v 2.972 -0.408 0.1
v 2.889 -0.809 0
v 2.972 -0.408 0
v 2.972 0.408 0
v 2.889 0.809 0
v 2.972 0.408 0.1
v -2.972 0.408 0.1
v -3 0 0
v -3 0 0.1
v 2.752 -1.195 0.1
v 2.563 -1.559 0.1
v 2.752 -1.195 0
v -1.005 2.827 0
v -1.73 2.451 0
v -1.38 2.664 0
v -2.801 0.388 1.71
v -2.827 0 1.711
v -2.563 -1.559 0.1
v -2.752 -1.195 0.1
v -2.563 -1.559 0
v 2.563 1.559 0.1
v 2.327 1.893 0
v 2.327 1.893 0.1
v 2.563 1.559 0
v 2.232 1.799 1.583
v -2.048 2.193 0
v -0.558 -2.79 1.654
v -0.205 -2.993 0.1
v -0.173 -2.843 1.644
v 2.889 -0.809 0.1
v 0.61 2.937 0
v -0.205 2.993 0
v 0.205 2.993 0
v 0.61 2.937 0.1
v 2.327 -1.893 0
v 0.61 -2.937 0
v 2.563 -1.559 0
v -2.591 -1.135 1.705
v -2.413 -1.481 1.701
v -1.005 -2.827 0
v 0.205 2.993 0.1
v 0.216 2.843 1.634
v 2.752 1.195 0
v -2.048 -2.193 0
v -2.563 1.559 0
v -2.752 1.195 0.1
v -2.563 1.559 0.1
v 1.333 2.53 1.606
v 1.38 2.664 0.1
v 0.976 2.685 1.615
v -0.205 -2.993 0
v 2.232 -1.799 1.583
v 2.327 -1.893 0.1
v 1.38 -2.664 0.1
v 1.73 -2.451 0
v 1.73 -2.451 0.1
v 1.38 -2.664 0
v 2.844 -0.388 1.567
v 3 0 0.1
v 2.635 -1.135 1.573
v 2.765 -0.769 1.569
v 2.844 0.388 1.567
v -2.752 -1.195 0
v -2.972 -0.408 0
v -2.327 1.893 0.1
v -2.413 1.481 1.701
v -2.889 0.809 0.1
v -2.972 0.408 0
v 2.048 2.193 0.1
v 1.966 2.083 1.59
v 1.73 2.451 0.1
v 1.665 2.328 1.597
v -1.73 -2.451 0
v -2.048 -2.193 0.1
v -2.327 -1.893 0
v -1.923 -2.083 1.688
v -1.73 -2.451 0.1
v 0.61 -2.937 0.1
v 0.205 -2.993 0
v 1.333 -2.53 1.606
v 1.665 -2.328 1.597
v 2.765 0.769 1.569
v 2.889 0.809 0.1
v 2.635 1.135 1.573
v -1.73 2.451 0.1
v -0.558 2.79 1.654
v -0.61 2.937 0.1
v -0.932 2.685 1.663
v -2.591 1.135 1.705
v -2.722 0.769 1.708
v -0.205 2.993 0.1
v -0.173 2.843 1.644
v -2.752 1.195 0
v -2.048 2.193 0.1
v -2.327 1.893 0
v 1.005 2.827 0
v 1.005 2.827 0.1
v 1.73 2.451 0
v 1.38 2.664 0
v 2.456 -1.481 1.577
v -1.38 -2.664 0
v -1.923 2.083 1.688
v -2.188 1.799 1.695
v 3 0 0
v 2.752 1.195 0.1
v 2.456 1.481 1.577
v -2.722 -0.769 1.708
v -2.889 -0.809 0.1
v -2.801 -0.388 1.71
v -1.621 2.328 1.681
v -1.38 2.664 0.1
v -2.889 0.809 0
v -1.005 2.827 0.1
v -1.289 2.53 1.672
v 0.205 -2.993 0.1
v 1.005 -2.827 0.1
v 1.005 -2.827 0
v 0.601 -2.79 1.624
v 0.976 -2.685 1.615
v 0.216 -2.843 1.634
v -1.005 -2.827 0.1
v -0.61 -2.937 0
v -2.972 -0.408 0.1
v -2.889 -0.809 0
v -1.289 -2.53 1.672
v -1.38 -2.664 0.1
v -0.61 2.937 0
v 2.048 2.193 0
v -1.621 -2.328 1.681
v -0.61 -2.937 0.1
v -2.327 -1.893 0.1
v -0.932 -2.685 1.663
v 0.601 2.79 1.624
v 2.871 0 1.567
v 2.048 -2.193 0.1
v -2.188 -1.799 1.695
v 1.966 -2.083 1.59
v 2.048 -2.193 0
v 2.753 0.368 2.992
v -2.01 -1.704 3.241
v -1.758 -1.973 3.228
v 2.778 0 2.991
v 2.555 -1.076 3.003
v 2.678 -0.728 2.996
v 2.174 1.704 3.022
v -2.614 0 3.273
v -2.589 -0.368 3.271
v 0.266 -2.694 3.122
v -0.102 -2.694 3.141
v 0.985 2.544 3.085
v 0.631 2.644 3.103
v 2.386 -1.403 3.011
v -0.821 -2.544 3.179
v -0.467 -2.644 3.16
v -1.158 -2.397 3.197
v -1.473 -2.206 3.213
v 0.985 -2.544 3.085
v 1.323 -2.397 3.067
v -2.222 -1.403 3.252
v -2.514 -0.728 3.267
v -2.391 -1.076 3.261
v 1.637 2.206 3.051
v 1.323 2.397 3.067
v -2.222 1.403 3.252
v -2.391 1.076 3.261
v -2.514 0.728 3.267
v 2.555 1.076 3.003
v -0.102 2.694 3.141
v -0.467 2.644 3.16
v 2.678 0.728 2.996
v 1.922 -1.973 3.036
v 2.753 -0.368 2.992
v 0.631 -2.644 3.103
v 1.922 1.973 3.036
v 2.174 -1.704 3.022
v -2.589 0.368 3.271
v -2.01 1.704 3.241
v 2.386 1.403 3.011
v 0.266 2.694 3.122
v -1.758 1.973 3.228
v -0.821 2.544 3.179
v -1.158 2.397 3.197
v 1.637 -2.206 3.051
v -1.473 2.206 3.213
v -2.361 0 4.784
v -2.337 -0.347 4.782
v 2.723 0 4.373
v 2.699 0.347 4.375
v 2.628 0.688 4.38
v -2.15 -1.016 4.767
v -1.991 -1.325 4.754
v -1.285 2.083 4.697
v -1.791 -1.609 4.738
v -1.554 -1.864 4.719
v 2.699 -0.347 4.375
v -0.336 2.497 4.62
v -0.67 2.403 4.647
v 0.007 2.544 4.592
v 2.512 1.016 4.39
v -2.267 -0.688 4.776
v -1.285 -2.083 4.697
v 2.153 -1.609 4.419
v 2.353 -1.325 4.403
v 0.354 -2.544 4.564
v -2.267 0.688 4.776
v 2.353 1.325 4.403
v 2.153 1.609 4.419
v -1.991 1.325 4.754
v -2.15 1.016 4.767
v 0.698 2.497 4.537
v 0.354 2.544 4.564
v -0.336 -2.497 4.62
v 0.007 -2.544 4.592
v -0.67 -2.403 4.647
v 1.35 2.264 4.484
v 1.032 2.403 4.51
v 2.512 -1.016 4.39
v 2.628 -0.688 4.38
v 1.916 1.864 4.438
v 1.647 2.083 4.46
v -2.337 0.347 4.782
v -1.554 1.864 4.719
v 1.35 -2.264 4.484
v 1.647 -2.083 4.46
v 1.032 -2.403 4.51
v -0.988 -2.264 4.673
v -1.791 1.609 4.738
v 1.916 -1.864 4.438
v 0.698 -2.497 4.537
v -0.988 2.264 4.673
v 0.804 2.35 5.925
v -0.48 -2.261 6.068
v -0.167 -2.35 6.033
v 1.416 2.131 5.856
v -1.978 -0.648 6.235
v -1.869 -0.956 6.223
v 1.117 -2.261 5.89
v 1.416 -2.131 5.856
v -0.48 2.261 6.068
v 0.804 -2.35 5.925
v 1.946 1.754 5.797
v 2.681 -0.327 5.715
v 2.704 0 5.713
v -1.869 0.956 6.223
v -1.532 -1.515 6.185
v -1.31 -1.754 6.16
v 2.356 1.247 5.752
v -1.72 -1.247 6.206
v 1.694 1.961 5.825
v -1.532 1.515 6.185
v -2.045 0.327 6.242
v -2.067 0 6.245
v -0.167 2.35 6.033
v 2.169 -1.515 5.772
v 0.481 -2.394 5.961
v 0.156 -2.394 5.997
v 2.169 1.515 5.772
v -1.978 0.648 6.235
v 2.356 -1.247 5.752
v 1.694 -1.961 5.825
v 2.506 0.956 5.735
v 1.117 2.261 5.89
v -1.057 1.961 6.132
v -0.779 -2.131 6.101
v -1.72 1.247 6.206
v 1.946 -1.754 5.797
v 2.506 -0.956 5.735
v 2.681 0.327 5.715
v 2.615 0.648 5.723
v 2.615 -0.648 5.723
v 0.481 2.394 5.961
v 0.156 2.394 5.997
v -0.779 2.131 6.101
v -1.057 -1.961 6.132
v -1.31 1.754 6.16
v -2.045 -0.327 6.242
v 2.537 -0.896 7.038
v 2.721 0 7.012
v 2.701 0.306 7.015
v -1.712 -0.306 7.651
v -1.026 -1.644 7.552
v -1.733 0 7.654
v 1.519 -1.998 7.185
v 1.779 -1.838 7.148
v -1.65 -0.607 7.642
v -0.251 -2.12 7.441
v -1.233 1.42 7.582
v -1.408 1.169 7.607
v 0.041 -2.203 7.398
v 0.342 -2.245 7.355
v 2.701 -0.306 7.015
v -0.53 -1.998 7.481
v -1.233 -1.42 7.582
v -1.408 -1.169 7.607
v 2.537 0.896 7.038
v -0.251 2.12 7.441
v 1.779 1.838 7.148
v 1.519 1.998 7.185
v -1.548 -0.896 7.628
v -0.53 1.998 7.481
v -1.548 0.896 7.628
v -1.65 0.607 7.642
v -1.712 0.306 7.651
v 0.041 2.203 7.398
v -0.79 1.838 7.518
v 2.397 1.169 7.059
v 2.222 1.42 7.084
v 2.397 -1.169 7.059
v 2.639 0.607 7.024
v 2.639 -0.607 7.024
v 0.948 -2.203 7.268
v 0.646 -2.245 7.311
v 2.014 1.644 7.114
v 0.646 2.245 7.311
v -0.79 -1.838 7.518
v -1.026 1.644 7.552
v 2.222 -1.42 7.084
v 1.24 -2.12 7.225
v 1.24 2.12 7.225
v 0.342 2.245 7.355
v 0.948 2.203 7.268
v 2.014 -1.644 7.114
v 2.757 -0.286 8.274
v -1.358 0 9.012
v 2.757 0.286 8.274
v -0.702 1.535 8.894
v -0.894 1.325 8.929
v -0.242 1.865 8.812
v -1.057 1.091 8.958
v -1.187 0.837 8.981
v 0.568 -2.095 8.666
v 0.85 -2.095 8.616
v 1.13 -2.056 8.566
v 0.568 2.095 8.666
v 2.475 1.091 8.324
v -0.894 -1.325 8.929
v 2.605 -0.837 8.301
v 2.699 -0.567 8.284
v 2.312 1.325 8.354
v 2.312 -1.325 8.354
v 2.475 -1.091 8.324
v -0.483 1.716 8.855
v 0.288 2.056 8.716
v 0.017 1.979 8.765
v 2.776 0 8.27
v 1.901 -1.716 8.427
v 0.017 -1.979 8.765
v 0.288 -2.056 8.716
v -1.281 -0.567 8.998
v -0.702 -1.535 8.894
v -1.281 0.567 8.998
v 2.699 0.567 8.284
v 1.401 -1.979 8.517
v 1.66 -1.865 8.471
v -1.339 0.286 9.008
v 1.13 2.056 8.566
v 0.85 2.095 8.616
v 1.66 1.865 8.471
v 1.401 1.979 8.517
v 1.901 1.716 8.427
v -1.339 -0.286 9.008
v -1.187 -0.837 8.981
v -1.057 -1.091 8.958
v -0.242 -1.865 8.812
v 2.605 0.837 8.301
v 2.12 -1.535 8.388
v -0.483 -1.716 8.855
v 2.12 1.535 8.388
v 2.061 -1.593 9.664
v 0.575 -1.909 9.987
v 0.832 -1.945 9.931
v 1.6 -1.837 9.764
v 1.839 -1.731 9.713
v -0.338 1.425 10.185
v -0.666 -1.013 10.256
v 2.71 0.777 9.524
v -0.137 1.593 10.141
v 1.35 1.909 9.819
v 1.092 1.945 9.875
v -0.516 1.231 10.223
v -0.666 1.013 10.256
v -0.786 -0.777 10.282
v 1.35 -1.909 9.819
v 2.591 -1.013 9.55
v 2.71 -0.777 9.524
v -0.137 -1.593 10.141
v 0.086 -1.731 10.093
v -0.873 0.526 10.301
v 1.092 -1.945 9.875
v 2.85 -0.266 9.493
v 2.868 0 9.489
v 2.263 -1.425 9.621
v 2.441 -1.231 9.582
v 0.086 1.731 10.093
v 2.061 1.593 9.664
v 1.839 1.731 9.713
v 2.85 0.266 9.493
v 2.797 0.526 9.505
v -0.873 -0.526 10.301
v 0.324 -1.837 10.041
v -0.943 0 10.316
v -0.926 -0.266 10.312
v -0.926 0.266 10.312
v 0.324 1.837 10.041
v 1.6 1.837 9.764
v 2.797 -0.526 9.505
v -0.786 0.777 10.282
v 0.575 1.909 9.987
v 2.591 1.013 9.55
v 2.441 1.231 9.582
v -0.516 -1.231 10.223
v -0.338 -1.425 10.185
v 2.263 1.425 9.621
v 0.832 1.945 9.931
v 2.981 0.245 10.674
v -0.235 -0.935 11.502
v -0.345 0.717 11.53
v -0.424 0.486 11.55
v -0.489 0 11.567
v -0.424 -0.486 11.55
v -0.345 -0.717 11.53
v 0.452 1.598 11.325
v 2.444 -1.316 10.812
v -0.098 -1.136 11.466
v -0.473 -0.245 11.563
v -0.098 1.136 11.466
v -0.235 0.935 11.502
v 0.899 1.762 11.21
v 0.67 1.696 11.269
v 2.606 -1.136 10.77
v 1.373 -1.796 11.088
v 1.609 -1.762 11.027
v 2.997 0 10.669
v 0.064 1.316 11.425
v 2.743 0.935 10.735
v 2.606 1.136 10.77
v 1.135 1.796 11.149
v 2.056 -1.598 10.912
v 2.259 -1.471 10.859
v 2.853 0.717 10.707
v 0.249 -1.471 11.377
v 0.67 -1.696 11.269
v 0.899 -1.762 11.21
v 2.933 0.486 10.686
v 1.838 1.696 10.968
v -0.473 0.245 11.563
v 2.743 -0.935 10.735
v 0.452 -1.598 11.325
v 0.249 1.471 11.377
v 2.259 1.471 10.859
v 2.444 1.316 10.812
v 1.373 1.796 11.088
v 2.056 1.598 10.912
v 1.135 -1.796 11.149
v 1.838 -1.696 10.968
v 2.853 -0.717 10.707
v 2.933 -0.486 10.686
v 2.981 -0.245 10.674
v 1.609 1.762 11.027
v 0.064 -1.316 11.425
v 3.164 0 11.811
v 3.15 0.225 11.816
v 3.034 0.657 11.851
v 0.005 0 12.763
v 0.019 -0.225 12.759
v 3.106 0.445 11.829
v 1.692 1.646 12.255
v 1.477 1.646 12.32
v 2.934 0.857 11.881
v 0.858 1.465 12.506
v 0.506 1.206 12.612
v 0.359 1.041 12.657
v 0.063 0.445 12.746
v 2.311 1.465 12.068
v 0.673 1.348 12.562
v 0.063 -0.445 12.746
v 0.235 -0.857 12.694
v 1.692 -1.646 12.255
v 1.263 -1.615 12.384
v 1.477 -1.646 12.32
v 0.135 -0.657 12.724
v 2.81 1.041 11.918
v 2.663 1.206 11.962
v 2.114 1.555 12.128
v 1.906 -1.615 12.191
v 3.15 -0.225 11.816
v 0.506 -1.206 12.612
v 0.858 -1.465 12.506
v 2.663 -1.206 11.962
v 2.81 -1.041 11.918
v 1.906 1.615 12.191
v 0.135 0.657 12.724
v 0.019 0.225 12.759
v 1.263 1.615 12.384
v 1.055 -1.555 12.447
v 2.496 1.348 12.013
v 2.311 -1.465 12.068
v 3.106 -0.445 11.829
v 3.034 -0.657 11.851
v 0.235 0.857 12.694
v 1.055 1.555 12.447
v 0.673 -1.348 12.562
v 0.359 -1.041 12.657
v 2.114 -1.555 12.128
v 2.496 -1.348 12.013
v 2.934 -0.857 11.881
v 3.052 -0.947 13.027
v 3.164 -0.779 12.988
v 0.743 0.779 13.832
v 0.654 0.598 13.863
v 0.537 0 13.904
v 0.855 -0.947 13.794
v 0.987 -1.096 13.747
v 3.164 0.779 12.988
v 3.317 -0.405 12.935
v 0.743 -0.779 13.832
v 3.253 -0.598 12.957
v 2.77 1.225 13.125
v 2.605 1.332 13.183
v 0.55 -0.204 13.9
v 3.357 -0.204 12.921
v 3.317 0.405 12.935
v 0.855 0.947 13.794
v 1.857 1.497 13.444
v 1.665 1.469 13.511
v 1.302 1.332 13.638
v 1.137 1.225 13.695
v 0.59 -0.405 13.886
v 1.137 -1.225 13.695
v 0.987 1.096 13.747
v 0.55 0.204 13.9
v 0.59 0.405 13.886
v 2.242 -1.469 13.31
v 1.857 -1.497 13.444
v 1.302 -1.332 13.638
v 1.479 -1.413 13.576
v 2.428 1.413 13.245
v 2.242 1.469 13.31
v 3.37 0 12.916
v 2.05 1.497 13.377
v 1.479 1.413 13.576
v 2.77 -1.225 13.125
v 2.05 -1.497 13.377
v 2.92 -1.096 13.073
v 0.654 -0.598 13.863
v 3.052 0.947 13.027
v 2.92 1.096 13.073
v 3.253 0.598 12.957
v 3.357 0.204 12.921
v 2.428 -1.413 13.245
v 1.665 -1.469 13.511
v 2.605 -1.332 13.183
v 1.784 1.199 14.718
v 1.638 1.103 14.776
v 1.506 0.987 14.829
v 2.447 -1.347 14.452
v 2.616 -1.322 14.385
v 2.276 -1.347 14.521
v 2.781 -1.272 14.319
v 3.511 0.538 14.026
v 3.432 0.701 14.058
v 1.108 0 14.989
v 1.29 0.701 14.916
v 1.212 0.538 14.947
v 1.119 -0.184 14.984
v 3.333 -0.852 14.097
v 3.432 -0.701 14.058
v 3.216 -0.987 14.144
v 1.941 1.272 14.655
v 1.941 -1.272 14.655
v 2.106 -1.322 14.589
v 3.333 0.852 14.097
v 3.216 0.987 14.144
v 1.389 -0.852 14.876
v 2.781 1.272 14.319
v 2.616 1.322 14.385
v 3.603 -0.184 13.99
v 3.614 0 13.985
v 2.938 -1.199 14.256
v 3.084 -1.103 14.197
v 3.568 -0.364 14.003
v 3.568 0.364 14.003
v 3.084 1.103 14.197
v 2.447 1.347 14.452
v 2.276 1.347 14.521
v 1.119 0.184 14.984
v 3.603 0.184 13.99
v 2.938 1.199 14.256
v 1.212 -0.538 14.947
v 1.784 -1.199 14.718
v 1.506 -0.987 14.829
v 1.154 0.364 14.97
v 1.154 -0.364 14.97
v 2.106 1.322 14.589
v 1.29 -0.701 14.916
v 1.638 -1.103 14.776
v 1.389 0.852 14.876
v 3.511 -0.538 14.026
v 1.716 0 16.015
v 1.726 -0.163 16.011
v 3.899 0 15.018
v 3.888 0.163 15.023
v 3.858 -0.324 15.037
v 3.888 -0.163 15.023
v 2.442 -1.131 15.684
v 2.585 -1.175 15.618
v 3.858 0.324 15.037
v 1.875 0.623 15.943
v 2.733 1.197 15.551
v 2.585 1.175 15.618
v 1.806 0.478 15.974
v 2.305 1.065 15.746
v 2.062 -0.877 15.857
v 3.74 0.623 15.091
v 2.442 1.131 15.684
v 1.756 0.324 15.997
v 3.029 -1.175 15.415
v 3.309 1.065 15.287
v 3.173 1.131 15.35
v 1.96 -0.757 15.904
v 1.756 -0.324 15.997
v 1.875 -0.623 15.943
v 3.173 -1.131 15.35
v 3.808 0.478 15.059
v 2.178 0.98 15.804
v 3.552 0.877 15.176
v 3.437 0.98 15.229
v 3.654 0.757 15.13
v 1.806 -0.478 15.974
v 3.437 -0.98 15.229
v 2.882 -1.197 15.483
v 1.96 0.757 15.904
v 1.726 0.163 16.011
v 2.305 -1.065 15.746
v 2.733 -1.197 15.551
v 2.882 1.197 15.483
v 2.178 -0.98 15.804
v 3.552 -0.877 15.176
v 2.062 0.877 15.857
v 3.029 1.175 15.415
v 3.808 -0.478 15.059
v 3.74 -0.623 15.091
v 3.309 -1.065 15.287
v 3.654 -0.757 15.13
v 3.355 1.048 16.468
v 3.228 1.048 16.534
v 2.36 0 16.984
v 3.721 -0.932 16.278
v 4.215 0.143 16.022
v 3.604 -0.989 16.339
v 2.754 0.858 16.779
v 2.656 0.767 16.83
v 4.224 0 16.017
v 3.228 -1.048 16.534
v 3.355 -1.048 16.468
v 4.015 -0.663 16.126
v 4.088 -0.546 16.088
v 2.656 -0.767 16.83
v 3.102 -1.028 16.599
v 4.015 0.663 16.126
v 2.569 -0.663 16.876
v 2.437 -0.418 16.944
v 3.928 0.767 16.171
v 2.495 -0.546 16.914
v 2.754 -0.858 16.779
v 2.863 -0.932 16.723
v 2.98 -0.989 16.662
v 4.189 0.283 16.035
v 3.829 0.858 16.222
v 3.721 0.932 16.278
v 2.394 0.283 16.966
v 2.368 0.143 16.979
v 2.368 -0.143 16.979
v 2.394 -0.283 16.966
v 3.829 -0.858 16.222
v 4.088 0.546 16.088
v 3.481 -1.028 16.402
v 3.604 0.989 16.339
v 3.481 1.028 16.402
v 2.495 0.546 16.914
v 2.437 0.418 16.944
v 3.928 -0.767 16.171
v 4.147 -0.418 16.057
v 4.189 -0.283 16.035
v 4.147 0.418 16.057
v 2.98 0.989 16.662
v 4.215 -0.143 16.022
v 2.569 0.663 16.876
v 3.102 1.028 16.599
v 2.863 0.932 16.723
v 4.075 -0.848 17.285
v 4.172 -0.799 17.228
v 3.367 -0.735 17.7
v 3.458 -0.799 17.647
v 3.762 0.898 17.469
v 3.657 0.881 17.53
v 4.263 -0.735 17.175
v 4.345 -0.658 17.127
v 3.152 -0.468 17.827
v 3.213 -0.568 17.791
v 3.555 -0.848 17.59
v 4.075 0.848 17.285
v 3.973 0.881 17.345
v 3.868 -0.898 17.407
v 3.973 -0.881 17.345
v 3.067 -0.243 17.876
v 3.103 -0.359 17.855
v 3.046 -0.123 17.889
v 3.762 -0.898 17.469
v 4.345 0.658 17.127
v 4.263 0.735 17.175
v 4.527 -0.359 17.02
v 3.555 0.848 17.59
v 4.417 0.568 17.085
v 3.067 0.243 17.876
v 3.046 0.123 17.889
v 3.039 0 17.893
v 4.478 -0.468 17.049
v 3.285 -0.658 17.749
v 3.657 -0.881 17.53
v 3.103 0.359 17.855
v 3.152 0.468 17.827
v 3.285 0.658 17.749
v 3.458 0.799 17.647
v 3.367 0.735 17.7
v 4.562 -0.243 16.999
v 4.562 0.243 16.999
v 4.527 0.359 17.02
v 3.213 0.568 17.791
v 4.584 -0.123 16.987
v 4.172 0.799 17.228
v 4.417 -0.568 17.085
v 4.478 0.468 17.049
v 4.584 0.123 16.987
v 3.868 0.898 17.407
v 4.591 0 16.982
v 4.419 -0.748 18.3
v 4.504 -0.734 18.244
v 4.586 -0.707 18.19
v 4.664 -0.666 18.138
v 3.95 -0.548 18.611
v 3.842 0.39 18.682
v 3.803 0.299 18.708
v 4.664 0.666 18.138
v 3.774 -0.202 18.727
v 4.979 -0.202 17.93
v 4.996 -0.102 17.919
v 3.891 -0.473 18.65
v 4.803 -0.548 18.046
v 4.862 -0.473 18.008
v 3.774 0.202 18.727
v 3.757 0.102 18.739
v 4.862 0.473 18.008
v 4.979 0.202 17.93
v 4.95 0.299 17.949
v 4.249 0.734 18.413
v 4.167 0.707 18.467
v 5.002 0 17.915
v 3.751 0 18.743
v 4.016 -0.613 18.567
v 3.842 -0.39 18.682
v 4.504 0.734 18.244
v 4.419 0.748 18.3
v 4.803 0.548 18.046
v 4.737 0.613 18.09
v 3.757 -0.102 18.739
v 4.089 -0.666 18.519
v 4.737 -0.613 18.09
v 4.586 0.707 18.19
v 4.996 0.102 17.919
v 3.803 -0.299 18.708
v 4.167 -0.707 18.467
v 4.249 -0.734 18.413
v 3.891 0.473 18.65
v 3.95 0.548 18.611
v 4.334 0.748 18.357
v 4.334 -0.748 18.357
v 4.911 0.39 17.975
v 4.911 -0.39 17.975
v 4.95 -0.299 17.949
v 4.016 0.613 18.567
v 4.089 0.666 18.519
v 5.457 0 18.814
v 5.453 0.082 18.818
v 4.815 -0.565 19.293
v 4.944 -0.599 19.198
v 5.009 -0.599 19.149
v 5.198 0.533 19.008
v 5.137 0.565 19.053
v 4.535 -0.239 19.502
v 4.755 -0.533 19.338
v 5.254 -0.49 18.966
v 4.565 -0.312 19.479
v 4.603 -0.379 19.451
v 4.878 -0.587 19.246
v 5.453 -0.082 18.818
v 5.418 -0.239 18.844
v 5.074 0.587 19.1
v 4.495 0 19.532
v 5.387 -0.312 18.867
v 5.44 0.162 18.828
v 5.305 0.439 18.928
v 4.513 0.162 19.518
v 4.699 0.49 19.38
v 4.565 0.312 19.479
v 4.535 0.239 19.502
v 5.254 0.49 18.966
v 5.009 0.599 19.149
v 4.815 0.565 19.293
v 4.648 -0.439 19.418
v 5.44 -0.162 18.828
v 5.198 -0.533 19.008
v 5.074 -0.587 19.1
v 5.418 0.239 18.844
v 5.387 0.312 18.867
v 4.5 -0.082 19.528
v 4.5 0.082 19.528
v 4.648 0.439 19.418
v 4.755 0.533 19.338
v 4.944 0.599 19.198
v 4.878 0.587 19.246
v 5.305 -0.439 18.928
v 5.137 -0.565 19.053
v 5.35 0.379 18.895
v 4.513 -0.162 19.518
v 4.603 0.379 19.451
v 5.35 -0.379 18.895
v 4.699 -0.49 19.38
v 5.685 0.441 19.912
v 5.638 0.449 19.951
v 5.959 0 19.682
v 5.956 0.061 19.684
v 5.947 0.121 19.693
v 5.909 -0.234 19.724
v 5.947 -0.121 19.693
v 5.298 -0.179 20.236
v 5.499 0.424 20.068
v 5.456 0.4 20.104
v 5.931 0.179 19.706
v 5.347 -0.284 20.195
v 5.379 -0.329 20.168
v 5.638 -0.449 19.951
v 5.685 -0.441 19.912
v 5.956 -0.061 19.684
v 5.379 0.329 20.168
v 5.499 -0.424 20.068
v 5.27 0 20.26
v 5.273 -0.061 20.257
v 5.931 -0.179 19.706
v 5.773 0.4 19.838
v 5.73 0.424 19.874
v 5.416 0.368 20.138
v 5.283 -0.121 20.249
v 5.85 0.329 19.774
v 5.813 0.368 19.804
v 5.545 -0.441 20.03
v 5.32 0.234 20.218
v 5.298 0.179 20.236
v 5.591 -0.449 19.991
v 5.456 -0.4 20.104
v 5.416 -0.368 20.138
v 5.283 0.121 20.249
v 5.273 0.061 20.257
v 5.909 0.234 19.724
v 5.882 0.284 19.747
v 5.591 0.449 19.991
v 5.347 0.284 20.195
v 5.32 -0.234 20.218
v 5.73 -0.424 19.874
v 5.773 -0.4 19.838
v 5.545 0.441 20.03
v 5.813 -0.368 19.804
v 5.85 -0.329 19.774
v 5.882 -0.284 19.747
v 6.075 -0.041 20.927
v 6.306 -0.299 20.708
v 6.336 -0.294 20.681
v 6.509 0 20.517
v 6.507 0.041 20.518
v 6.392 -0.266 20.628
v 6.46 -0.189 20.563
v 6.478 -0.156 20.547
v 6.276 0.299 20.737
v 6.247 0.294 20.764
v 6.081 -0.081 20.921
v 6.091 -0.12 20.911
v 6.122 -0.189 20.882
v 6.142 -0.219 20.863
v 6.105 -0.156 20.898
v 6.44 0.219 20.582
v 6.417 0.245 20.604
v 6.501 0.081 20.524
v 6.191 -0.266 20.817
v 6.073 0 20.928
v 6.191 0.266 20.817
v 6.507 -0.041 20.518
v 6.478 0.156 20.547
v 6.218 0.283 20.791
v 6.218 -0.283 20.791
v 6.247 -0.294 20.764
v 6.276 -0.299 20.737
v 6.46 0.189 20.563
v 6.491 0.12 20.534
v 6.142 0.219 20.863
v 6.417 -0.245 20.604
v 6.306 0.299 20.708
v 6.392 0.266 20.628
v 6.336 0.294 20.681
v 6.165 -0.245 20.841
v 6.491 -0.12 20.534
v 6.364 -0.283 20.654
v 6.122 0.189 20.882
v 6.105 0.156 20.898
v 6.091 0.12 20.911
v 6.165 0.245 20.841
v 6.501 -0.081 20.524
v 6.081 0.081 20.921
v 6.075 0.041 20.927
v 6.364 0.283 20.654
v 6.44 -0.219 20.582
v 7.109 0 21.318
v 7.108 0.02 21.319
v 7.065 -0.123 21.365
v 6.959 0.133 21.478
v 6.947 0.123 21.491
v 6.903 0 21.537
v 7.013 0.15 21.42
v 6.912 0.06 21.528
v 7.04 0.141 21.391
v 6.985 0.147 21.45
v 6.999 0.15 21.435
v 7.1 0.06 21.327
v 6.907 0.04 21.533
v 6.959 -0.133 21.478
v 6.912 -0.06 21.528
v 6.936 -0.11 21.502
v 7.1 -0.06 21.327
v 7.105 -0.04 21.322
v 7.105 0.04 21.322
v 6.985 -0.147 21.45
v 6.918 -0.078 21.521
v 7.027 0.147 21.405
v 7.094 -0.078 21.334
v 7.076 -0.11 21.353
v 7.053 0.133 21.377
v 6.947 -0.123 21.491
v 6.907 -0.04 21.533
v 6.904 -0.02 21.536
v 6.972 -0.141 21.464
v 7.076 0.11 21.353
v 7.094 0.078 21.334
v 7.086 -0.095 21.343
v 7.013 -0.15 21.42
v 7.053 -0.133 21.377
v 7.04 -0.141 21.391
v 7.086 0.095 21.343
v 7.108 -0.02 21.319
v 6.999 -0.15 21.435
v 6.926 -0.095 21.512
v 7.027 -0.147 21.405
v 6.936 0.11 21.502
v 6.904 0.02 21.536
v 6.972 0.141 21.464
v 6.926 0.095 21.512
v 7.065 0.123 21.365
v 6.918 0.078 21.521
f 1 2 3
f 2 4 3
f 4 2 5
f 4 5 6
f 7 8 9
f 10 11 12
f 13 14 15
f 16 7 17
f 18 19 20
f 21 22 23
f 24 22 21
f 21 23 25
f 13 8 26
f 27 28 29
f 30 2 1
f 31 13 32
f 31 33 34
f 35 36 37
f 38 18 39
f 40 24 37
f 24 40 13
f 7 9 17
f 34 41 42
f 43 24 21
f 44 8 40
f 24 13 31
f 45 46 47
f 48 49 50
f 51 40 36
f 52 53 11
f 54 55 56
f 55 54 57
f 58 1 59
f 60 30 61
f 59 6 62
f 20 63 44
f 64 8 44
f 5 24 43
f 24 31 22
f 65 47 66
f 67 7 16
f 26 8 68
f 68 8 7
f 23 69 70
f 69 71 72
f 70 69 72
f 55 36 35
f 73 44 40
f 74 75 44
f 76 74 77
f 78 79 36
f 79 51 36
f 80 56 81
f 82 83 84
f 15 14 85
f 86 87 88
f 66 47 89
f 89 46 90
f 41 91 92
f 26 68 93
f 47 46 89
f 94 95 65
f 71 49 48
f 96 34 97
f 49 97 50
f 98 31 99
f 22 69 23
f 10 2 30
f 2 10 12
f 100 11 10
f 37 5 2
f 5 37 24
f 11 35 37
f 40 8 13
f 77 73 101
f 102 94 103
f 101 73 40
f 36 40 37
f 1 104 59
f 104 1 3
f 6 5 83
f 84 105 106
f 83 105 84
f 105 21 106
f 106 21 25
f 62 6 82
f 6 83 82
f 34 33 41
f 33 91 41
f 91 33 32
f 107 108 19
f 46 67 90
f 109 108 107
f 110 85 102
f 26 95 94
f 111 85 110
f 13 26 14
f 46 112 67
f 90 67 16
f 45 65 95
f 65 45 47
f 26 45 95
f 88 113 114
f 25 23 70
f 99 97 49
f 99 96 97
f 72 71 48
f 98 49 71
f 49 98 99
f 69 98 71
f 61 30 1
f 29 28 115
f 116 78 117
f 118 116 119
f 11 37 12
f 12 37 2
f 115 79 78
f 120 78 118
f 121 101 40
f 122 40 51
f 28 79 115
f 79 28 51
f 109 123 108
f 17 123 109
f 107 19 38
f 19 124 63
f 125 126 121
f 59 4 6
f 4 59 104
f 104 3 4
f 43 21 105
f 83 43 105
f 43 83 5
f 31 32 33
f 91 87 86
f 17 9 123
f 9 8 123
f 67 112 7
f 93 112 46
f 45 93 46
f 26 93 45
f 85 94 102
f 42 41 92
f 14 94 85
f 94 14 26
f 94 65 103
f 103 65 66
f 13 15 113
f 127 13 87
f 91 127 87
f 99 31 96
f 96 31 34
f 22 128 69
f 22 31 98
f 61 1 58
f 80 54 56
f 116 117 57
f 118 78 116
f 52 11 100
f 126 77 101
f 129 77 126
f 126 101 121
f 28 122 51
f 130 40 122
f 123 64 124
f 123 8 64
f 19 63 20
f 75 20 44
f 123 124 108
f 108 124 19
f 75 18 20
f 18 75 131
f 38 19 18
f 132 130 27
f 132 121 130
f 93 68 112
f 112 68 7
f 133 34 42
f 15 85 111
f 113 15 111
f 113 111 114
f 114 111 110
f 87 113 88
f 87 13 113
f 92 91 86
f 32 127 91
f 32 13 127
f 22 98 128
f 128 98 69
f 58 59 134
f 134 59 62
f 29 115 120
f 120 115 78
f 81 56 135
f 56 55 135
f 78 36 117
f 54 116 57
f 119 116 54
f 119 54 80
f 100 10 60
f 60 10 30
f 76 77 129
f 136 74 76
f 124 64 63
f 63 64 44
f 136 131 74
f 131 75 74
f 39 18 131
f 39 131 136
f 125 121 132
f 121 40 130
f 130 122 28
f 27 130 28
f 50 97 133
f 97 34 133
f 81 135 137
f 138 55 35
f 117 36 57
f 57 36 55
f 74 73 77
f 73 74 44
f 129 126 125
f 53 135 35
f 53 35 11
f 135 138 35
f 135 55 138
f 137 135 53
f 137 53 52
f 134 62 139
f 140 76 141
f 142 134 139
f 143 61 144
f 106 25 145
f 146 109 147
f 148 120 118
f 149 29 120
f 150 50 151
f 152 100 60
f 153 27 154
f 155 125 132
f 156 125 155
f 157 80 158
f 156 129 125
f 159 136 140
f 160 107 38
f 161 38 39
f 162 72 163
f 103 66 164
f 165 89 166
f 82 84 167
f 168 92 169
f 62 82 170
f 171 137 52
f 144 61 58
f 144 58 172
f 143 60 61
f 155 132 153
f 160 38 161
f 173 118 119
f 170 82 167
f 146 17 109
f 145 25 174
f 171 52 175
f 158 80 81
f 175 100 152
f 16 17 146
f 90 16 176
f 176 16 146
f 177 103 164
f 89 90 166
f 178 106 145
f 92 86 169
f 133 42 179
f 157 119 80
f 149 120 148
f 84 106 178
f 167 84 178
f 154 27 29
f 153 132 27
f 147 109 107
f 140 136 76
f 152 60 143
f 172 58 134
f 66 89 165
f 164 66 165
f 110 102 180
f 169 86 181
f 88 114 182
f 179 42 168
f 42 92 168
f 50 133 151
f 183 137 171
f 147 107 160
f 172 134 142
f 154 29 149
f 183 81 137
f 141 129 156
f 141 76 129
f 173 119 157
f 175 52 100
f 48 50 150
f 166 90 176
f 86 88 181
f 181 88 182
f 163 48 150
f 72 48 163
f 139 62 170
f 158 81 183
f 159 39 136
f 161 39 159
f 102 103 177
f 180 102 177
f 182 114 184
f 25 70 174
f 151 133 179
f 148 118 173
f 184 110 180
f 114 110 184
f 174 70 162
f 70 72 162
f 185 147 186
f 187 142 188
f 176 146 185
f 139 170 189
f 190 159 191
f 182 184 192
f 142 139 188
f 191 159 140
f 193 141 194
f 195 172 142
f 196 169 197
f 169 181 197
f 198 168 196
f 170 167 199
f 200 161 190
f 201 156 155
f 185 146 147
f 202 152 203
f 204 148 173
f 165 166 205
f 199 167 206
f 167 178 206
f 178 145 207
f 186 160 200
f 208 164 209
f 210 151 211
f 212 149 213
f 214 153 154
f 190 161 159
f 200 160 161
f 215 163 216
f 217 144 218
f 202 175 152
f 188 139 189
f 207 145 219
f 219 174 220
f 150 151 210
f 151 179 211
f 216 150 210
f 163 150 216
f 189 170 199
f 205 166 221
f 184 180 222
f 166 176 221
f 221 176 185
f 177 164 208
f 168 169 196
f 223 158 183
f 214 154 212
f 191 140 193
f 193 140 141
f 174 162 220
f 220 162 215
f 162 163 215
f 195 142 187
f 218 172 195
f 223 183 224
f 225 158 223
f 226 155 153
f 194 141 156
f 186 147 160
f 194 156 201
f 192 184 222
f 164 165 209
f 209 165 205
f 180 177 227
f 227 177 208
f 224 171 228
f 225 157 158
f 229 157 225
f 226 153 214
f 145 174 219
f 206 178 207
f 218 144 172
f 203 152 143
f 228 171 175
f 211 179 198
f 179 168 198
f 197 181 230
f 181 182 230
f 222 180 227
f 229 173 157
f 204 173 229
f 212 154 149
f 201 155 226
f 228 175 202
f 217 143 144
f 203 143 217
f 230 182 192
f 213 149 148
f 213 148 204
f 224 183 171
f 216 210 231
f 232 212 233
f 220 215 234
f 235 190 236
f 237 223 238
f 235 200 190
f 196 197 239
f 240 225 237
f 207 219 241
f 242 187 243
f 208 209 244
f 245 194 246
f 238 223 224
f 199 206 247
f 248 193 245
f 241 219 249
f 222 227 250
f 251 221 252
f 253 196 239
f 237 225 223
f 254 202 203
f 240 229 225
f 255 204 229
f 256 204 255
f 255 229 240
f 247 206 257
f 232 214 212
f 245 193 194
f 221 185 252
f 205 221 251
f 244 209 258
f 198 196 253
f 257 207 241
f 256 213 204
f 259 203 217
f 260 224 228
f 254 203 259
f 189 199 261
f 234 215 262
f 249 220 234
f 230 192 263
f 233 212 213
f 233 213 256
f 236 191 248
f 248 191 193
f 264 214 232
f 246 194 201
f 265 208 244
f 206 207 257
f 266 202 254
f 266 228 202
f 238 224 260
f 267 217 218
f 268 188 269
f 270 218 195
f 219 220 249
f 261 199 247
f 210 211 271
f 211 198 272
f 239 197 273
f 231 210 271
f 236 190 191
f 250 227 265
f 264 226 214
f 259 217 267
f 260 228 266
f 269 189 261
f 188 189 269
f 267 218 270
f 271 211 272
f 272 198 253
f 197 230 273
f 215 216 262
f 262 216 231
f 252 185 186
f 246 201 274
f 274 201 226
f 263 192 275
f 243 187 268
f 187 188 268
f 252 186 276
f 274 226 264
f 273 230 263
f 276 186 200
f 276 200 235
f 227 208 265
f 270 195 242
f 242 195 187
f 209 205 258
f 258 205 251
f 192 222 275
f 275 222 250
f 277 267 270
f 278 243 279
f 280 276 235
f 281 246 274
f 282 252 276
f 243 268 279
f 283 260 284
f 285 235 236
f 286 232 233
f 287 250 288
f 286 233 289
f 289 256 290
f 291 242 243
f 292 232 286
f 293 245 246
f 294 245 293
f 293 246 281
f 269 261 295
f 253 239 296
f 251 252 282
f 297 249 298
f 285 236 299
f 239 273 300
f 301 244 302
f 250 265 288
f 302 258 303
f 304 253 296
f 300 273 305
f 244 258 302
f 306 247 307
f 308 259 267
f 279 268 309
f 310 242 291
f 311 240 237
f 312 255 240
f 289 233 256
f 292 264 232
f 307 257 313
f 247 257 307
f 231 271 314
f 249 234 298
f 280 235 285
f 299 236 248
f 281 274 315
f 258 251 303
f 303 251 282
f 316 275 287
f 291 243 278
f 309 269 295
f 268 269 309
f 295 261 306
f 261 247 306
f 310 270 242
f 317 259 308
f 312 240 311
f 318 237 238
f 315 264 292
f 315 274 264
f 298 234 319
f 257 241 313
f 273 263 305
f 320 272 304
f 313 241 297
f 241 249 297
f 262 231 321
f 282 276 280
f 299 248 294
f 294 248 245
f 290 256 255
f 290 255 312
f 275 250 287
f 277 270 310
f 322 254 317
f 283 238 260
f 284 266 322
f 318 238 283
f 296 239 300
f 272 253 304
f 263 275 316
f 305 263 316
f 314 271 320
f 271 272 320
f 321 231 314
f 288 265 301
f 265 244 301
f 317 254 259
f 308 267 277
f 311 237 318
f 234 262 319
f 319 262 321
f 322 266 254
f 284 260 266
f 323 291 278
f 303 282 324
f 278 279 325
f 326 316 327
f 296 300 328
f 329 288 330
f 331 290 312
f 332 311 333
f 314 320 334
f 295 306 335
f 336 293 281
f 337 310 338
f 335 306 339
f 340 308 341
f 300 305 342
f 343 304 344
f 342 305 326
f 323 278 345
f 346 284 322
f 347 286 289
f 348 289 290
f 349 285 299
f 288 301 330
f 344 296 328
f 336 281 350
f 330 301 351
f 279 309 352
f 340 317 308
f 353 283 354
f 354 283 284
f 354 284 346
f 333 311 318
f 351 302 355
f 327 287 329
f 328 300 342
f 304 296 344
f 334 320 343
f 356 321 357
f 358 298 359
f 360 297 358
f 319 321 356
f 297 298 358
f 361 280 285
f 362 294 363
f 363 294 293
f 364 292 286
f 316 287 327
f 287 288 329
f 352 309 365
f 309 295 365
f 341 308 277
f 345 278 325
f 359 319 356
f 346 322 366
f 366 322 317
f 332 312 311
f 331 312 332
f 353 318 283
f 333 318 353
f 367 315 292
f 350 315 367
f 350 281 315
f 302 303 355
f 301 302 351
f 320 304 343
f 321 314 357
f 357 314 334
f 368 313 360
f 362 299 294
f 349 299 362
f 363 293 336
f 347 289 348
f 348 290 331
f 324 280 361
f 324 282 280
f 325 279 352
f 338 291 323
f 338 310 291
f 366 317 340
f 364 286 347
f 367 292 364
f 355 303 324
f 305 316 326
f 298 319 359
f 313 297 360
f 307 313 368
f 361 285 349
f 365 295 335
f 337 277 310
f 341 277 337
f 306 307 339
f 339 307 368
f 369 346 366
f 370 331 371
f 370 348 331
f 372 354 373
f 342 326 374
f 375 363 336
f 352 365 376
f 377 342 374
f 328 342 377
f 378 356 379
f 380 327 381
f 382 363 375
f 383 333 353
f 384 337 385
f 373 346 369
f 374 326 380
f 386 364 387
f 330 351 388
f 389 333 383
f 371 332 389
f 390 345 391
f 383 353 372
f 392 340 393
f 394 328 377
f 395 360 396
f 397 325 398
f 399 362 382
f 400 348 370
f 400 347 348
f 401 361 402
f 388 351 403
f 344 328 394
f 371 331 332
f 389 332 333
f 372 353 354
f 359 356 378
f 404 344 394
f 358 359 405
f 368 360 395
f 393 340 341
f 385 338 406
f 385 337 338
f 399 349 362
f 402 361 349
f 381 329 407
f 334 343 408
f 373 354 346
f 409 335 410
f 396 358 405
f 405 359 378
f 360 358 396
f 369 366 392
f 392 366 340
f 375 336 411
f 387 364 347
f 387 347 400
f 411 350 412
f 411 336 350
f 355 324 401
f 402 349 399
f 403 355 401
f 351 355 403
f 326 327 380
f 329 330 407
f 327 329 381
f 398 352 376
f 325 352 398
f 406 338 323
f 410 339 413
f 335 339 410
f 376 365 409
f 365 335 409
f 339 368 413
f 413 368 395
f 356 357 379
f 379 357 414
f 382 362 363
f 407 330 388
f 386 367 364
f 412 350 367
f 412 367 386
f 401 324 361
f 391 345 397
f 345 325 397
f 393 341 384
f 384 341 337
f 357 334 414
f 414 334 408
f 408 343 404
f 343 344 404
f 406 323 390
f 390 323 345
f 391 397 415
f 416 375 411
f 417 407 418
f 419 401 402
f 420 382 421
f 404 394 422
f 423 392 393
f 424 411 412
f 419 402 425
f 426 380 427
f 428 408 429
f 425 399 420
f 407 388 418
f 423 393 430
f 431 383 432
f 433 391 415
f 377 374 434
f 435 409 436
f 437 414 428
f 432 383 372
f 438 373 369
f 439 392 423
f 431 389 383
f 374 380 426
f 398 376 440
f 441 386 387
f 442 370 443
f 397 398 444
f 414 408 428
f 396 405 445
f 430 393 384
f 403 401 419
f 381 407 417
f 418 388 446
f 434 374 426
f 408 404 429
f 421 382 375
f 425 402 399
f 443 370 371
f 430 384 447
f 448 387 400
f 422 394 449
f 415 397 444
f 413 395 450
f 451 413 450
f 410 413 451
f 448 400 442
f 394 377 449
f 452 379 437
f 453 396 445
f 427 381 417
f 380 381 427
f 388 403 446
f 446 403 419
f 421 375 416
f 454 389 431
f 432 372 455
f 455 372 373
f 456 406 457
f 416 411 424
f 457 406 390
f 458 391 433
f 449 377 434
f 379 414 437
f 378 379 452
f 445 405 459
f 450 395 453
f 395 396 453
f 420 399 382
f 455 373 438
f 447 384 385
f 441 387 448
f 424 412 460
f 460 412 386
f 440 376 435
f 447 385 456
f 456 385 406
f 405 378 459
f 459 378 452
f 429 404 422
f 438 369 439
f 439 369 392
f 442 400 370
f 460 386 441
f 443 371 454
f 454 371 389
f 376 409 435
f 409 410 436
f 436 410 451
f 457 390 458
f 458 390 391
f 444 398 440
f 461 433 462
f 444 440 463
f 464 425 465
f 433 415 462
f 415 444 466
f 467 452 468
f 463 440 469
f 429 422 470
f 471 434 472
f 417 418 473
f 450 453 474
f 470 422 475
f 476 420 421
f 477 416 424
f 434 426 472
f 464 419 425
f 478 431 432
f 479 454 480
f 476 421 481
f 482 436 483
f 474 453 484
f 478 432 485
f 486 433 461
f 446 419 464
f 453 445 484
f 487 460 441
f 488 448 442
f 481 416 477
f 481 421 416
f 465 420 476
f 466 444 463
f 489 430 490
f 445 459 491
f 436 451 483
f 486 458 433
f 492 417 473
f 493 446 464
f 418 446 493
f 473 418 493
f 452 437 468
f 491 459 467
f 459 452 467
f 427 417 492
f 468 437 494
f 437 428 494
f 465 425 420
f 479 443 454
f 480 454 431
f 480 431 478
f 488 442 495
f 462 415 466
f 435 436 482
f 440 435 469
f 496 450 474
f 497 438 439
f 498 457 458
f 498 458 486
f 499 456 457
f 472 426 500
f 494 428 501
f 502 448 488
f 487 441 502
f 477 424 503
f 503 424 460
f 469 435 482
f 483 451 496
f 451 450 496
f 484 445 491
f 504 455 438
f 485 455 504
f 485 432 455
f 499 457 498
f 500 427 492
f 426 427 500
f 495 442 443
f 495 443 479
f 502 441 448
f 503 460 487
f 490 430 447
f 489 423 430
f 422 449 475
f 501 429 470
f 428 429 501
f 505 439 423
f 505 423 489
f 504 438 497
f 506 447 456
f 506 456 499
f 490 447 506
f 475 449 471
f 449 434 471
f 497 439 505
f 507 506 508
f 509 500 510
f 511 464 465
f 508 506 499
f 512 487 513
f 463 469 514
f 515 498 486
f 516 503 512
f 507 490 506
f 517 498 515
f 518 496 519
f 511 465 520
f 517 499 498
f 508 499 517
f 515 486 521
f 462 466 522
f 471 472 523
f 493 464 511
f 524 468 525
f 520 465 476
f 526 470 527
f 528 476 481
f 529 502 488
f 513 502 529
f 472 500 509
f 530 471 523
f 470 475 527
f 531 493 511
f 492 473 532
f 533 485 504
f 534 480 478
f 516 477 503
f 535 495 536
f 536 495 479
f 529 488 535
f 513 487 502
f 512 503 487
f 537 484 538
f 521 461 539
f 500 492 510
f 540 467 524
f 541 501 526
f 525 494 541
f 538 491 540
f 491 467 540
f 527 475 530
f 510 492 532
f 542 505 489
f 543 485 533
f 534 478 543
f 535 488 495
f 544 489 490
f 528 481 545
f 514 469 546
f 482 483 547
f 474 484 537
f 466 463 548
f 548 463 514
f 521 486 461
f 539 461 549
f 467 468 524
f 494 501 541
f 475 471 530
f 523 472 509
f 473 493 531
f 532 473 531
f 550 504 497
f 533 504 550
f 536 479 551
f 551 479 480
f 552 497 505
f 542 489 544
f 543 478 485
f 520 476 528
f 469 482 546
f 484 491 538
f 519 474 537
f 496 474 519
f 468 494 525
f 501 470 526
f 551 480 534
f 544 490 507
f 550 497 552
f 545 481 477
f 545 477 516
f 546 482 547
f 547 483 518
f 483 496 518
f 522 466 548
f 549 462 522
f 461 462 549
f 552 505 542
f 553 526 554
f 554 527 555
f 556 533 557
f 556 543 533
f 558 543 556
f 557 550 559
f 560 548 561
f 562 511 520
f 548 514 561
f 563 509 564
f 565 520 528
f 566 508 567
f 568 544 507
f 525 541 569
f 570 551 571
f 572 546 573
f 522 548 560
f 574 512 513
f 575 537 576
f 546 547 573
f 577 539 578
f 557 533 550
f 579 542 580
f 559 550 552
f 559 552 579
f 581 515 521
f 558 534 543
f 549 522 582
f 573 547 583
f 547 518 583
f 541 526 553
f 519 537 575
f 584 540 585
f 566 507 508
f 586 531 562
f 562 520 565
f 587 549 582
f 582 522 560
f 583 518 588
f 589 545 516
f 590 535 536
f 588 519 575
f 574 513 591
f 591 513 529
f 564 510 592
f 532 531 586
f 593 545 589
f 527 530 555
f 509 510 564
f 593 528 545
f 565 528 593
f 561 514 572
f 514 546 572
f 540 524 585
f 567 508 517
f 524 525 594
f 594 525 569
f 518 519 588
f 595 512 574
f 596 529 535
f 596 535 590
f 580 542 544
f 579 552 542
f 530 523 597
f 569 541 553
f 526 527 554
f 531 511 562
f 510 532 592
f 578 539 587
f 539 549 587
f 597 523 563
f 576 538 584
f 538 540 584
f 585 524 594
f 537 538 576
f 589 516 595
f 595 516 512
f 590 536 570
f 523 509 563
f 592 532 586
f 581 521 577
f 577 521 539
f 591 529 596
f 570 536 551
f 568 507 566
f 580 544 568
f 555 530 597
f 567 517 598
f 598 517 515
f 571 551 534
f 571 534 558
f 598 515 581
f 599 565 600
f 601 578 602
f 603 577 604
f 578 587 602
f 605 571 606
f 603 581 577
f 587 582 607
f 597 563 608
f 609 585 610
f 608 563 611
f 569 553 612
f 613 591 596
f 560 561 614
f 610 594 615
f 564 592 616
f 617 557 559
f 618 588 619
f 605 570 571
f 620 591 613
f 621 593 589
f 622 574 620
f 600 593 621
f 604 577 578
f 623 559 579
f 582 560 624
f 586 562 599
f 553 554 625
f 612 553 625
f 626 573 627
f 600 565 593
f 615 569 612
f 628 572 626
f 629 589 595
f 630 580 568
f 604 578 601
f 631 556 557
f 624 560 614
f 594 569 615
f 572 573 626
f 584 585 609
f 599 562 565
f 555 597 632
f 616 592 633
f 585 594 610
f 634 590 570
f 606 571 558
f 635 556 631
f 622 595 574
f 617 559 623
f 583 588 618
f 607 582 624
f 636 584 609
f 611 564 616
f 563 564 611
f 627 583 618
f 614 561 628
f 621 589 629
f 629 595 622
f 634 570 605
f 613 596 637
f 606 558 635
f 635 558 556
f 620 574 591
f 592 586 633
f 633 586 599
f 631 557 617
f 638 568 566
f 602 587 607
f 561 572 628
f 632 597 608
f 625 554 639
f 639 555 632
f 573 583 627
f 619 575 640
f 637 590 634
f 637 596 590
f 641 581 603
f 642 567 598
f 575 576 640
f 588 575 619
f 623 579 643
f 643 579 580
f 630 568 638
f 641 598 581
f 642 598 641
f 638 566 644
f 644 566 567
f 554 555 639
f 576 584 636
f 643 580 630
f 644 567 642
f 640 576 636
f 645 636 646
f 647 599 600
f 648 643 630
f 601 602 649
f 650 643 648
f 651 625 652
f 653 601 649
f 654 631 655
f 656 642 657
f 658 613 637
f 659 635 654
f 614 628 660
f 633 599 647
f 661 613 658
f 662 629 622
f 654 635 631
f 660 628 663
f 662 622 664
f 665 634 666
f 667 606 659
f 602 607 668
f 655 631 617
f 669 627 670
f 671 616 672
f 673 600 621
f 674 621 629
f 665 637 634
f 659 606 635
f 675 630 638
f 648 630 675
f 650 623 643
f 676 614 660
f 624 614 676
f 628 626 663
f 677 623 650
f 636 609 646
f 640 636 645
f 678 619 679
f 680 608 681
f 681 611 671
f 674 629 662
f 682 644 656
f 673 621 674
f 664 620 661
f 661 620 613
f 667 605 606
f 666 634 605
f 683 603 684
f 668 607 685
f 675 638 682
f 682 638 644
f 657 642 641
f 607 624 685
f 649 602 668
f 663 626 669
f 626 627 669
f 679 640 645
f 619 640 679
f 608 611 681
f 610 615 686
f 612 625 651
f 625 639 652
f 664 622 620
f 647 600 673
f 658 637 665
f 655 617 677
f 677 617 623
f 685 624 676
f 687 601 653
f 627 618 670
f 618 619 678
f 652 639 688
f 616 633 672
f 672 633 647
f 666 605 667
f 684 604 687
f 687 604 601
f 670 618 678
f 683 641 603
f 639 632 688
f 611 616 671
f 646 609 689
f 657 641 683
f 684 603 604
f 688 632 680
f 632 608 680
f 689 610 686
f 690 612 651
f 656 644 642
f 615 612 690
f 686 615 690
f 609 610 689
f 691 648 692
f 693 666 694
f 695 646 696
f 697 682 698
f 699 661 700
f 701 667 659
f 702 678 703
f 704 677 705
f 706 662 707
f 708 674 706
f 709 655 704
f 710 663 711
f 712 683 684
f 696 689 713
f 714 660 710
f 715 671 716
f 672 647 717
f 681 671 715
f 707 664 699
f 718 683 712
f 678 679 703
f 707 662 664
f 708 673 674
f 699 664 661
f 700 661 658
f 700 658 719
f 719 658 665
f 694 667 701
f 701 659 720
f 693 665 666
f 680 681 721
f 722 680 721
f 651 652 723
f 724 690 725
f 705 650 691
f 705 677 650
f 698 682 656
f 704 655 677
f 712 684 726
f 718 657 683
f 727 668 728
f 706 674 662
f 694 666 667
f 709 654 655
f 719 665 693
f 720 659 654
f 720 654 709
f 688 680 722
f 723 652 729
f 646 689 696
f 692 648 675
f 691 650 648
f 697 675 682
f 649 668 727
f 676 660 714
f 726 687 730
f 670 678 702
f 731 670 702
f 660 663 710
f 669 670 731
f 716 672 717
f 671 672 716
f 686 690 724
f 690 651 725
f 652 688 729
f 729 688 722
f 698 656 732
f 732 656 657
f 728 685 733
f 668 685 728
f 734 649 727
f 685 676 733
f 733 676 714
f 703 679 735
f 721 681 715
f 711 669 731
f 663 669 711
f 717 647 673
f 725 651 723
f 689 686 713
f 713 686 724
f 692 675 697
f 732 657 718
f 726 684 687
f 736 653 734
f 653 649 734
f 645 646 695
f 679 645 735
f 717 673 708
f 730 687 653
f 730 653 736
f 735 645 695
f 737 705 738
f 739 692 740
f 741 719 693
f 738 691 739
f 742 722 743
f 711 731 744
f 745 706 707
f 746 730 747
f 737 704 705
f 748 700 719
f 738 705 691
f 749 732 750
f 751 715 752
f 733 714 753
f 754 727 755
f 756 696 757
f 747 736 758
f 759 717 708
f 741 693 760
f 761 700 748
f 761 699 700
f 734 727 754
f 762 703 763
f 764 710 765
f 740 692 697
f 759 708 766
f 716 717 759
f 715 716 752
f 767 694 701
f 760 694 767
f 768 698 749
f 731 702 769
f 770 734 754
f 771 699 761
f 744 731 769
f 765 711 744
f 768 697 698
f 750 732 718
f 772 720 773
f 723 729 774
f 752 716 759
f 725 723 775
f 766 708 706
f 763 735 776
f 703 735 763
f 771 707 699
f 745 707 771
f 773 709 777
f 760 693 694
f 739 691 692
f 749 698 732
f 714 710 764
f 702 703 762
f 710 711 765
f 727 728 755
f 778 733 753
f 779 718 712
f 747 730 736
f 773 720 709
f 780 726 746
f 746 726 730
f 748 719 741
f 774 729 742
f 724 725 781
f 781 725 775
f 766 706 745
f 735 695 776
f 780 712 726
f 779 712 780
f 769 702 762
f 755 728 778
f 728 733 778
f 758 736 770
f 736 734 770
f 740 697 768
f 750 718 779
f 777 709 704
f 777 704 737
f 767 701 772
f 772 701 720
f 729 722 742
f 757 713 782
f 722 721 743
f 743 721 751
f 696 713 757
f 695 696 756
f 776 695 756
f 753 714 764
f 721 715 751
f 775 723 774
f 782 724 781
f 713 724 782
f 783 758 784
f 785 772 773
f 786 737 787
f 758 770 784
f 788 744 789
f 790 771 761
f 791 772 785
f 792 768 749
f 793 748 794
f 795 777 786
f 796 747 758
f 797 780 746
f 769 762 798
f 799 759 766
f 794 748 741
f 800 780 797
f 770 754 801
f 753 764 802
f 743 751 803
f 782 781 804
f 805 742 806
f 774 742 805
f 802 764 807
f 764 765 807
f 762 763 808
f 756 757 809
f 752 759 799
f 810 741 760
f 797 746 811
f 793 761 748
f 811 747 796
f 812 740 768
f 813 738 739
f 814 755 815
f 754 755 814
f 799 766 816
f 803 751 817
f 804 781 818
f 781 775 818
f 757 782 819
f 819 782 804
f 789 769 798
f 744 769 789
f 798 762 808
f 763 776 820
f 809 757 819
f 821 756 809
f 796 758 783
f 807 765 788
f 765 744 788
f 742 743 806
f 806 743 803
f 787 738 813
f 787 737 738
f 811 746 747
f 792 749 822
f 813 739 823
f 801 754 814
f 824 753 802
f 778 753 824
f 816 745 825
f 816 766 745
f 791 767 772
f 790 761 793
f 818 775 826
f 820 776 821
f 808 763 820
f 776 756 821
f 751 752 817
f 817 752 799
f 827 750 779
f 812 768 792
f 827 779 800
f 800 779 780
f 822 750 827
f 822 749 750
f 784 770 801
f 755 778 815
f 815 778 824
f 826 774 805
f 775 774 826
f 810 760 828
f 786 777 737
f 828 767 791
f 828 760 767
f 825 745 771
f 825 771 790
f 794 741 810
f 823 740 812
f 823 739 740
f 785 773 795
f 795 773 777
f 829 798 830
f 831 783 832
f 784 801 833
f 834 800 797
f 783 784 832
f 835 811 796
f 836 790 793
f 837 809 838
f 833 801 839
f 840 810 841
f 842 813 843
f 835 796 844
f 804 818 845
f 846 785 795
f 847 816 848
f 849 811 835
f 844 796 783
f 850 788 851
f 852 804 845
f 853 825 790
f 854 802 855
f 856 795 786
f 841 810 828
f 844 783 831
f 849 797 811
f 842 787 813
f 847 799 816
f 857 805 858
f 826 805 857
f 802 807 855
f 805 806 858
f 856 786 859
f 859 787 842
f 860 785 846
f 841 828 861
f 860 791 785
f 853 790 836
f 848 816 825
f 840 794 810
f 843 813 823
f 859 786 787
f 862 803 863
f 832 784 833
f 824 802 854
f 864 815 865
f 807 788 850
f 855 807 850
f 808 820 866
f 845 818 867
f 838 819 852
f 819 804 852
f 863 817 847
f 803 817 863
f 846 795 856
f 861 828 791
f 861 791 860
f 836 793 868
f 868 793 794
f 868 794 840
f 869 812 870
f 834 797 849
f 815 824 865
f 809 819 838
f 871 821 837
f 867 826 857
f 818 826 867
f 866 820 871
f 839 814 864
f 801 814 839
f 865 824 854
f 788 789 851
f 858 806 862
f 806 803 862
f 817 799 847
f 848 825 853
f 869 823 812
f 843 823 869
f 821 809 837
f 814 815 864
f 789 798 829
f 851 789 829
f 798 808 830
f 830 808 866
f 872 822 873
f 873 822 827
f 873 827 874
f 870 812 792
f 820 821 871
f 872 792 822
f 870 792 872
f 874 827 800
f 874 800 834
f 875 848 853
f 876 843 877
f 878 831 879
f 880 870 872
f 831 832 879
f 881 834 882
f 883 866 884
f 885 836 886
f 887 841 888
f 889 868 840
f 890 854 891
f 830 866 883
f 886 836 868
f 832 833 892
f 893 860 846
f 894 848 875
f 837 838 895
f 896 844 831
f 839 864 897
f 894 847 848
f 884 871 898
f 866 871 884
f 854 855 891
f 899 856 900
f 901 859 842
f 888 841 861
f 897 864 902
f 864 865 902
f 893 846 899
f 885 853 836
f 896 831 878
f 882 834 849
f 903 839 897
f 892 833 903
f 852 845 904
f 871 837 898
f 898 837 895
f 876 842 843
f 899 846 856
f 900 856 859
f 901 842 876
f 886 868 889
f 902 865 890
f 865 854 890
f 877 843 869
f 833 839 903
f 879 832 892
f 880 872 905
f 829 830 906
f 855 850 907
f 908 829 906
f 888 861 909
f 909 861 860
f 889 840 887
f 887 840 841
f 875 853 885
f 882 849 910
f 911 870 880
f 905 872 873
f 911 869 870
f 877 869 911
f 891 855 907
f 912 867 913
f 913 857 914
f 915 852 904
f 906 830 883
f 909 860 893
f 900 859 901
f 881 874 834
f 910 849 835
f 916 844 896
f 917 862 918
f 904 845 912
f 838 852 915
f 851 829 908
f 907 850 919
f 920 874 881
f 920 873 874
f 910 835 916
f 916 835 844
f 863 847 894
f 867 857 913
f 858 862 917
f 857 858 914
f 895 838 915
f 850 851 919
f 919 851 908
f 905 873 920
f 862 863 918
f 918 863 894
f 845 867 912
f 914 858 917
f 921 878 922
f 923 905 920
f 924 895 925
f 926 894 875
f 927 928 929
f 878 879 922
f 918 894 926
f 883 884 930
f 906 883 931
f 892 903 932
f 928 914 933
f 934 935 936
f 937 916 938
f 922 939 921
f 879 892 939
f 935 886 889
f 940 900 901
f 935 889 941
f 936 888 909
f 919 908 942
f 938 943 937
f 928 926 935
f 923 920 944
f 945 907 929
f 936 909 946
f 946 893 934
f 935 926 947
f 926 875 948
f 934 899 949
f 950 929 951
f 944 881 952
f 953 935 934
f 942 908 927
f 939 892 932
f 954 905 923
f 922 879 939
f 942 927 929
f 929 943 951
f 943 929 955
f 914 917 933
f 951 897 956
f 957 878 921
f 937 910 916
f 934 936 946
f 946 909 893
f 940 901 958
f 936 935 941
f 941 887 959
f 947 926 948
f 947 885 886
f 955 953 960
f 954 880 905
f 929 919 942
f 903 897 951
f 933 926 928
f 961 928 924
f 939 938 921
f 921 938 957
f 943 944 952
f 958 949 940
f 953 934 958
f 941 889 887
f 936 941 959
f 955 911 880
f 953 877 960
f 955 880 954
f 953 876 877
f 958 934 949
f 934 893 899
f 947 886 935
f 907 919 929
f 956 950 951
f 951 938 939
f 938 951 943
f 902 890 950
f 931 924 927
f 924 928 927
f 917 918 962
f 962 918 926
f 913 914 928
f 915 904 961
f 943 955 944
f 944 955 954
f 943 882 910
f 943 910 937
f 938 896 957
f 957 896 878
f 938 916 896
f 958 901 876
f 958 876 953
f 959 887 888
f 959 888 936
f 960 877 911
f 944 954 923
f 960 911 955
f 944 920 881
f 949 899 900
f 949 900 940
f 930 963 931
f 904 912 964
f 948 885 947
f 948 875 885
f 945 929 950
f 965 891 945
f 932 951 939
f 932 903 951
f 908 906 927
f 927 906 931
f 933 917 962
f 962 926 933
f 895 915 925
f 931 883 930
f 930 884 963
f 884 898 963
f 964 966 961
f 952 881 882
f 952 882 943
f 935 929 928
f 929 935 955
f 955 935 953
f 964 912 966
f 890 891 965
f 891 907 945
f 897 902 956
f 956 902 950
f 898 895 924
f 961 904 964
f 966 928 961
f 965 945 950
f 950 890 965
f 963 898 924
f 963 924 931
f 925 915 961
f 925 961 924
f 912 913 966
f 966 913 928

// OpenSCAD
$fn = 46;

resolution =  20;

xmax = 20;

curvature = -0.03;

base_r = 3;

// parabola y = curvature(x-xmax)^2 - xmax^2
// curvature defines the curvature, but also controls the maximum y
// base_r controls the radius at the base, tapering to near zero point
// slope of parabola y' = 2*curvature(x-xmax)
// perpendicular slope T = 1/y'
// "x" is parametric as t*x, and one increment further as (t + s)*x
// then the whole thing is tilted back by the slope at x = 0: atan(1/(2*curvature*xmax))
// this means xmax isn't really the maximum x, but the projection onto the x axis

module horn(xmax, base_r, curvature=-0.03, resolution=20) {
    s = 1/resolution;

    rotate([0, atan(1/(2*curvature*xmax)), 0]){
        for(t=[0:s:1]){
            u = t + s;
            hull(){
            translate( [t*xmax, 0, (curvature*pow((t - 1)*xmax,2) - curvature*pow(xmax,2))] ) rotate([ 0, atan(1/(2*curvature*((t - 1)*xmax))), 0]) cylinder(r =  base_r*(1 - t), h = .1);

            translate( [u*xmax, 0, (curvature*pow((u - 1)*xmax,2) - curvature*pow(xmax,2))] ) rotate([ 0, atan(1/(2*curvature*(u - 1)*xmax)), 0]) cylinder(r =  base_r*(1 - u), h = .1);
            }
        }
    }
}

horn(xmax, base_r, curvature, resolution);
